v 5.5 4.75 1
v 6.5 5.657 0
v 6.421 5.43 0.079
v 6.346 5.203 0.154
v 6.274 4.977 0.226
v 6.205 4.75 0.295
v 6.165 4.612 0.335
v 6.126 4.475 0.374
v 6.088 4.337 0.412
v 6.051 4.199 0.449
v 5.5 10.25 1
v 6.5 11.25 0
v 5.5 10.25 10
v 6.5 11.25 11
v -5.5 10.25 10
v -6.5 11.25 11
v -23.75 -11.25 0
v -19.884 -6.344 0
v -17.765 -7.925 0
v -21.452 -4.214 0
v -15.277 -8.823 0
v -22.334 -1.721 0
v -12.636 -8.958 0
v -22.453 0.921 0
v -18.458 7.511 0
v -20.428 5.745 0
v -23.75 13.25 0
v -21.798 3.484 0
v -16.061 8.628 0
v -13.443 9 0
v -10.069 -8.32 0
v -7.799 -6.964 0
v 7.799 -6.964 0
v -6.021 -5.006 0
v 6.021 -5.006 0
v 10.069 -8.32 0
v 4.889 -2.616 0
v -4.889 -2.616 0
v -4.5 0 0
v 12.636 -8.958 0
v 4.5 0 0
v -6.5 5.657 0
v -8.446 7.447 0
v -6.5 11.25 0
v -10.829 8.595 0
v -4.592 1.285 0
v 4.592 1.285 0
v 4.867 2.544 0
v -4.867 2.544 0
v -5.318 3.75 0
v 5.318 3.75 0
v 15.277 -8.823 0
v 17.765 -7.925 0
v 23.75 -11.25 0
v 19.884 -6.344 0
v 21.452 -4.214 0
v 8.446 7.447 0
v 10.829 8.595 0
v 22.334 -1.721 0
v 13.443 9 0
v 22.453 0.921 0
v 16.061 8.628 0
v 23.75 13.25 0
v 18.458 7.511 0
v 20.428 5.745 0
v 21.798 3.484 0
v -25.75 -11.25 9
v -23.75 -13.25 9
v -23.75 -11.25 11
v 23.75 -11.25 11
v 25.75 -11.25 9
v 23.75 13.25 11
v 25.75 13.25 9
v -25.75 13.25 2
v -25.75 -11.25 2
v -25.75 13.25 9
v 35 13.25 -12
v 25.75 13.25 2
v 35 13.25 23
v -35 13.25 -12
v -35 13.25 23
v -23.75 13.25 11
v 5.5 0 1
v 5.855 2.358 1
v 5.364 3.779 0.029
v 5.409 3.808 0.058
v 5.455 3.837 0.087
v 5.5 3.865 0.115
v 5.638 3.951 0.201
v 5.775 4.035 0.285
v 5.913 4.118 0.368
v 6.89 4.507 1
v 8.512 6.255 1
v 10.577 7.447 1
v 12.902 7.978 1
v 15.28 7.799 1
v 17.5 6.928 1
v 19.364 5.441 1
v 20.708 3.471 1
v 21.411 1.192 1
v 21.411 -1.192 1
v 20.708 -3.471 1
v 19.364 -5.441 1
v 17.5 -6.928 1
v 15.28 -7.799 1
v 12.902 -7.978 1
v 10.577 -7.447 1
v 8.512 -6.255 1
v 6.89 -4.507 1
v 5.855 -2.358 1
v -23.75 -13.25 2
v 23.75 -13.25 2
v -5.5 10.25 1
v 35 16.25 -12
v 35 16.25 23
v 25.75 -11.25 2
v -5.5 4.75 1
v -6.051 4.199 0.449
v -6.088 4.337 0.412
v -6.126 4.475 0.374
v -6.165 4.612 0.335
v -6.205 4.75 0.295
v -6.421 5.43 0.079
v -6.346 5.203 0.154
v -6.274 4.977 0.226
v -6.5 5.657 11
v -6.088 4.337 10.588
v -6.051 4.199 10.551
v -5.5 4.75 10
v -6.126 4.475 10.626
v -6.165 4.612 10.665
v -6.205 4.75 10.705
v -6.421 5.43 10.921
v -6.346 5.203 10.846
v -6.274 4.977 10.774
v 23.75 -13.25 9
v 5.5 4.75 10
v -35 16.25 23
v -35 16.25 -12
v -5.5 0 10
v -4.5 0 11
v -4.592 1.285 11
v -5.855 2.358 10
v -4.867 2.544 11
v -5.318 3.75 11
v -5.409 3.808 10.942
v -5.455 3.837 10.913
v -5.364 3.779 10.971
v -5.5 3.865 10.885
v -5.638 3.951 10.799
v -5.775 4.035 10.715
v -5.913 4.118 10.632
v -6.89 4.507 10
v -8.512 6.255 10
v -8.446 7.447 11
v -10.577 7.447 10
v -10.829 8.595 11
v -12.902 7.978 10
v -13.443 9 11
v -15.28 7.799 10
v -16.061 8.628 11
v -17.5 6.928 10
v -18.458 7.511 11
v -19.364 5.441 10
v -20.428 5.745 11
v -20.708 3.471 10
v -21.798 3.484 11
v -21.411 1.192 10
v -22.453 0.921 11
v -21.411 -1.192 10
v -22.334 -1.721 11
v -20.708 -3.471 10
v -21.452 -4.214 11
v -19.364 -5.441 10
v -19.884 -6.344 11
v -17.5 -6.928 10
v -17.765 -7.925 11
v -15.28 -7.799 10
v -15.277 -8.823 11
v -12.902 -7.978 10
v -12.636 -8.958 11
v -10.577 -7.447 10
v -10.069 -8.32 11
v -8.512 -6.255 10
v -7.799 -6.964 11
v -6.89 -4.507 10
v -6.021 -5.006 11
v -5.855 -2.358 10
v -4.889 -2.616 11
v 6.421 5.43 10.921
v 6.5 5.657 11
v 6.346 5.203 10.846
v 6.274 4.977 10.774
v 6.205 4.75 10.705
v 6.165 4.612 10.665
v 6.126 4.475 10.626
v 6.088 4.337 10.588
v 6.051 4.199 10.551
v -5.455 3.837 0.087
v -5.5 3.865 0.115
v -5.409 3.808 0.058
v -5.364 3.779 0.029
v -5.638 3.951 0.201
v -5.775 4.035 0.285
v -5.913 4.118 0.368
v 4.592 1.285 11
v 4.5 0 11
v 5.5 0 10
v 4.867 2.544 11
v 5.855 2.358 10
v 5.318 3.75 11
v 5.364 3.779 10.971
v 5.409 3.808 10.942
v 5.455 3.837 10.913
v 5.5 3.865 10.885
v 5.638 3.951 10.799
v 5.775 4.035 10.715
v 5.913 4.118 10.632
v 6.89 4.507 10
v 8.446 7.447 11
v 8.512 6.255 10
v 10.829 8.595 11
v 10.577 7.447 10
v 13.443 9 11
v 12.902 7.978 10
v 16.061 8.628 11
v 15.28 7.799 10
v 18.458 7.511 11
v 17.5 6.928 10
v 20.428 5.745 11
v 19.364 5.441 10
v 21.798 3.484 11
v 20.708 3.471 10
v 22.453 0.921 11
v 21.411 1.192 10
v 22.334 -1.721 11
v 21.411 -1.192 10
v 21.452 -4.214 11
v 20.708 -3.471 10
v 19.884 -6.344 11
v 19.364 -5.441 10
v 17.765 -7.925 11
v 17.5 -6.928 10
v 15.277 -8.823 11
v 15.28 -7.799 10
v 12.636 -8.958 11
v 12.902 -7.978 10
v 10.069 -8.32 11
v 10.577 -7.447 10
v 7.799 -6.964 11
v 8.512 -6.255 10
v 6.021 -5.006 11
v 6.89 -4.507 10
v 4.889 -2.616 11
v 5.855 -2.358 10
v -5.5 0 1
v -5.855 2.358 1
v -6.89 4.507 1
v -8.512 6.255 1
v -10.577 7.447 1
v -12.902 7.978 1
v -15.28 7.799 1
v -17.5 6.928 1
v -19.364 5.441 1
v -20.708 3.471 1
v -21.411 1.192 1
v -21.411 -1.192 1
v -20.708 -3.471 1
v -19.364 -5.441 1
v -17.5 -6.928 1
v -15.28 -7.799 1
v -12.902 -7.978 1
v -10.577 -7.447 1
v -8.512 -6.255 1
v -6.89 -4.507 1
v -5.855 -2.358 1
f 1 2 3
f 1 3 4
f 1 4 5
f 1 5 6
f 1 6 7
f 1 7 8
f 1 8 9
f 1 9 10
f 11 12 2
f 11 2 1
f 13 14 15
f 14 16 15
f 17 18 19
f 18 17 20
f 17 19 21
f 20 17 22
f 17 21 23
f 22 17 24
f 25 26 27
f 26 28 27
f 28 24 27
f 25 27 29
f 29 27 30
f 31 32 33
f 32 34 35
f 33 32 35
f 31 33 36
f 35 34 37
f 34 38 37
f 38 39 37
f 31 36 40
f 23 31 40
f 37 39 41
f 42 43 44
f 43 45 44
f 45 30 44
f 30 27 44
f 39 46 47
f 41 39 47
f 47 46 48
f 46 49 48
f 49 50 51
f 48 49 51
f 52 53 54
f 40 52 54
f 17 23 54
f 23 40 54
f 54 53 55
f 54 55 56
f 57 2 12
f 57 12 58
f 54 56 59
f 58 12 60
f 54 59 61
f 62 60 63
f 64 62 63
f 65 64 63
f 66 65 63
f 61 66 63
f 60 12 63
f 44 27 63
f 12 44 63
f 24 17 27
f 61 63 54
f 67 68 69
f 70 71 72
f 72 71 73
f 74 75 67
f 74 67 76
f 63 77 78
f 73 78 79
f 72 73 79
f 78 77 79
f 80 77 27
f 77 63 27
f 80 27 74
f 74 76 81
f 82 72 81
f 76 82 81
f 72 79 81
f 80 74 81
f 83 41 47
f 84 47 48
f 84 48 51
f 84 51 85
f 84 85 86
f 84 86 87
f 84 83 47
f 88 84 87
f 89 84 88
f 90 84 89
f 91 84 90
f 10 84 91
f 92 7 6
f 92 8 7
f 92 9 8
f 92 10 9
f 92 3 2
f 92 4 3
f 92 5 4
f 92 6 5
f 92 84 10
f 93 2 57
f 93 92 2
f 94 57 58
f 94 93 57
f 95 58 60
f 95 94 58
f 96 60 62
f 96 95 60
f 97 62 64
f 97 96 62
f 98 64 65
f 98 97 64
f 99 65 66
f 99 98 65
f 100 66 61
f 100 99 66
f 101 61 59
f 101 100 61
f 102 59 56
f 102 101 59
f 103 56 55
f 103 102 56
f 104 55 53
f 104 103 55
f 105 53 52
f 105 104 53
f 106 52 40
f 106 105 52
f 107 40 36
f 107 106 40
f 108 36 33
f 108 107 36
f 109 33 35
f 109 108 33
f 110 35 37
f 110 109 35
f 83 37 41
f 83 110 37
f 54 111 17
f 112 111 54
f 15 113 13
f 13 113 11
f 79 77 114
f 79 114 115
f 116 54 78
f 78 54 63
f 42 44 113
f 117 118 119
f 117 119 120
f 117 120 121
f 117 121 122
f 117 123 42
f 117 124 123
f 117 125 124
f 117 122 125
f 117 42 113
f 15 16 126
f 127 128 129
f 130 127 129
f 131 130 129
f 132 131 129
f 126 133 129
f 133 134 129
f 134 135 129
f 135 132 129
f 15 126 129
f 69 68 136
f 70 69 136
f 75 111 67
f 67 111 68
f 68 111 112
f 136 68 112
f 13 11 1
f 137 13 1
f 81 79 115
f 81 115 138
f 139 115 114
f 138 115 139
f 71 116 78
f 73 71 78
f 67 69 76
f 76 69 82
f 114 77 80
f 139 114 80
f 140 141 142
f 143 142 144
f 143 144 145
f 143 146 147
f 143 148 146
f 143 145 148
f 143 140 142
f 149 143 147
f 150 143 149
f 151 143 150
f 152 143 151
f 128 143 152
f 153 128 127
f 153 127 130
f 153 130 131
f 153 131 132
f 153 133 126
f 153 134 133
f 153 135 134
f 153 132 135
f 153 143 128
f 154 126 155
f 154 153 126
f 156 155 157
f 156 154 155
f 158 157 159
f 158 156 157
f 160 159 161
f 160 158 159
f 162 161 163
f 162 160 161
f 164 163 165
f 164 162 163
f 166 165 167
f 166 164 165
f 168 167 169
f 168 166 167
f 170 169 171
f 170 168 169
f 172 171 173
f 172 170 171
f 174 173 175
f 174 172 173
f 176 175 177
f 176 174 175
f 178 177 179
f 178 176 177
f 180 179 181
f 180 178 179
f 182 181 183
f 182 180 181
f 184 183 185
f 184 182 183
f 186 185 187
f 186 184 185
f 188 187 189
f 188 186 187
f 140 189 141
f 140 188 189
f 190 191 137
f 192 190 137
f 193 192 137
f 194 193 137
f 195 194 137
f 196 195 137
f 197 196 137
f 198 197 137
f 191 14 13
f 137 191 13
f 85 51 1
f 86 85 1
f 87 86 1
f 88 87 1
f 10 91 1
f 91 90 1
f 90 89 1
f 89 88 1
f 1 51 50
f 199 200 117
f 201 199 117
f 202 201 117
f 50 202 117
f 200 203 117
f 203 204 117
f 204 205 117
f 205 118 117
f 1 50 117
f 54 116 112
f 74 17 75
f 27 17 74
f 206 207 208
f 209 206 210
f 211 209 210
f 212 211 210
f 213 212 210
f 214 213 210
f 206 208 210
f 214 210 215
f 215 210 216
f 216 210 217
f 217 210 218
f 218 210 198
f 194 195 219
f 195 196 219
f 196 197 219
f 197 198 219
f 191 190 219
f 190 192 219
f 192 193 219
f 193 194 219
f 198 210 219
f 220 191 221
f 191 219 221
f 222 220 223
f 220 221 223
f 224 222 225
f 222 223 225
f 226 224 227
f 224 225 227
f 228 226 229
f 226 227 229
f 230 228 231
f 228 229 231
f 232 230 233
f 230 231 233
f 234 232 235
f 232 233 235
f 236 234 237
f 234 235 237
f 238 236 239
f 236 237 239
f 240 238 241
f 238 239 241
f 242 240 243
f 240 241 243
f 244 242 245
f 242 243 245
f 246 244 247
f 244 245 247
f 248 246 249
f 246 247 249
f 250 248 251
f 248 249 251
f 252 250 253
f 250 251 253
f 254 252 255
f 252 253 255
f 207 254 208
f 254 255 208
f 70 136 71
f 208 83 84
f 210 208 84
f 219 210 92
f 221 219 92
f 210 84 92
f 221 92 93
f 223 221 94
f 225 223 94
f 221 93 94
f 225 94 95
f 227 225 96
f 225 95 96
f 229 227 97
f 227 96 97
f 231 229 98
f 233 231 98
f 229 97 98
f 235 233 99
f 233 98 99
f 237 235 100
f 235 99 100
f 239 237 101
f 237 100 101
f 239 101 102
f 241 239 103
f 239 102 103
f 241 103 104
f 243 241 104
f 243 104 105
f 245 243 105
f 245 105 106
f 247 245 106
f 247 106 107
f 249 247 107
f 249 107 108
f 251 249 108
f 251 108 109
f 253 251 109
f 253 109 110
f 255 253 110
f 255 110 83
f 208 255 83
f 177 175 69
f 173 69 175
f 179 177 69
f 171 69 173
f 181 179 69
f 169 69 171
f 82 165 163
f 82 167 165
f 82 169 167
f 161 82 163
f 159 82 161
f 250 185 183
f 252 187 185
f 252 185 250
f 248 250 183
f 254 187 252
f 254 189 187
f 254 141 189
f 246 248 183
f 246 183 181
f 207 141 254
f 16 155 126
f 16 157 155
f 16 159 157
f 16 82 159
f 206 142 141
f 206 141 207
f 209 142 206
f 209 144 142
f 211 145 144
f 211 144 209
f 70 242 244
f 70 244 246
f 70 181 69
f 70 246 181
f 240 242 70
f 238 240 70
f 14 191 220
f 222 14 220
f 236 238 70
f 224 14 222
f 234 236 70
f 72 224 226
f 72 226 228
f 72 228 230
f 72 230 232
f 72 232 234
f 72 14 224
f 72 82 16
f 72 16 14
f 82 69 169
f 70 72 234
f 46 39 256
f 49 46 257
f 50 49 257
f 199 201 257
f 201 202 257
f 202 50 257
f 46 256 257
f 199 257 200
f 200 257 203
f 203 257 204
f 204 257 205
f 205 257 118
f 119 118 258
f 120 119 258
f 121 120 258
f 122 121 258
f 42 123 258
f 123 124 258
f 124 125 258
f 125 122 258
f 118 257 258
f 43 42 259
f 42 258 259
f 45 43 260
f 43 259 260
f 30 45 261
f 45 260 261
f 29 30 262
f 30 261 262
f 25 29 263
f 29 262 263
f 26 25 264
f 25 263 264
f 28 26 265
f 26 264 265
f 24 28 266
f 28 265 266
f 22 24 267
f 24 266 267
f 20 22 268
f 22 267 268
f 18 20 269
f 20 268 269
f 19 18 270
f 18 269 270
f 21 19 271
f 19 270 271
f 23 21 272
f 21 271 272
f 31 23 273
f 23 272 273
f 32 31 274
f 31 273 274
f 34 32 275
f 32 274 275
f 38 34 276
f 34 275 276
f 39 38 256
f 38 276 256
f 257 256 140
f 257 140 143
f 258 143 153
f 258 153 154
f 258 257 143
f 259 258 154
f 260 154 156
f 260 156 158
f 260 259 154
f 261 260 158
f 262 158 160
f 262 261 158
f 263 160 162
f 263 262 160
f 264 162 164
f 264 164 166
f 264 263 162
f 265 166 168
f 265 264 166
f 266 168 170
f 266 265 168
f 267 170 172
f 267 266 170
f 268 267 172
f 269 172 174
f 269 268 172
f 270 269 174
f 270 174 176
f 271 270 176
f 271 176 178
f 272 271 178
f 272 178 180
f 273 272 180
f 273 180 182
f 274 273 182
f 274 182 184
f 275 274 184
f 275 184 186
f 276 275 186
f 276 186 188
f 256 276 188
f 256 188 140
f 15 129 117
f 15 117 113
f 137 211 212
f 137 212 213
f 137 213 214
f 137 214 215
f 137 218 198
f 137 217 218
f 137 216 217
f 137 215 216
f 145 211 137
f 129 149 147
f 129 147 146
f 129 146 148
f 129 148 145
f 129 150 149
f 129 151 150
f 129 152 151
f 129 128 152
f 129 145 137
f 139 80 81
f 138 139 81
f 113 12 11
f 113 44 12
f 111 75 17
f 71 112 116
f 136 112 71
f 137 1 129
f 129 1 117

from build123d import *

# Parameters (mm, degrees)
F0_W         = 51.5
F0_H         = 26.5
F0_R         = 8
F1_DEPTH     = 11
F2_W         = 70
F2_H         = 35
F2_W_2       = 25.75
F2_H_2       = 11
F3_DEPTH     = 3
F4_SIZE      = 2
F5_T1_DEPTH  = 11
F5_T3_DEPTH  = 5.5
F5_T17_DEPTH = 8.071682988
F5_T21_DEPTH = 13.571682988
F5_T28_DEPTH = 13.571682988
F5_T32_DEPTH = 8.071682988
F5_T39_DEPTH = 13.571682988
F5_T43_DEPTH = 8.071682988
F5_T50_DEPTH = 13.571682988
F5_T54_DEPTH = 8.071682988
F5_T61_DEPTH = 8.071682988
F5_T65_DEPTH = 13.571682988
F5_T72_DEPTH = 13.571682988
F5_T76_DEPTH = 8.071682988
F5_T83_DEPTH = 13.571682988
F5_T87_DEPTH = 8.071682988
F5_T94_DEPTH = 13.571682988
F5_T98_DEPTH = 8.071682988


# Not quite as in the source:
# - a fillet or chamfer that OpenCascade refuses, or shapes differently, is made with other operations: its cross-section is extruded or revolved along the edge and cut away or added


with BuildPart() as f1:
    # F0 (on Top) → F1 (new body)
    with BuildSketch(Plane.XY):
        Rectangle(F0_W, F0_H)
        Polygon((5.5, 10.25), (22.75, 10.25), (22.75, -10.25), (-22.75, -10.25), (-22.75, 10.25), (-5.5, 10.25), align=None, mode=Mode.SUBTRACT)
        Polygon((22.75, -10.25), (22.75, 10.25), (5.5, 10.25), (5.5, 4.75), (-5.5, 4.75), (-5.5, 10.25), (-22.75, 10.25), (-22.75, -10.25), align=None)
        with Locations((-13.5, 0)):
            Circle(F0_R, mode=Mode.SUBTRACT)
        with BuildLine():
            ThreePointArc((21.5, 0), (13.5, -8), (5.5, 0))
            ThreePointArc((5.5, 0), (13.5, 8), (21.5, 0))
        make_face(mode=Mode.SUBTRACT)
    extrude(amount=F1_DEPTH)

    # F2 (on face) → F3 (join)
    with BuildSketch(Plane(origin=(0, 13.25, 0), x_dir=(-1, 0, 0), z_dir=(0, 1, 0))):
        with Locations((0, 5.5)):
            Rectangle(F2_W, F2_H)
        Polygon((25.75, 0), (0, 0), (-25.75, 0), (-25.75, 11), (0, 11), (25.75, 11), align=None, mode=Mode.SUBTRACT)
        with Locations((-12.875, 5.5)):
            Rectangle(F2_W_2, F2_H_2)
        with Locations((12.875, 5.5)):
            Rectangle(F2_W_2, F2_H_2)
    extrude(amount=F3_DEPTH)

    # F4
    f4_edges = [f1.edges().sort_by_distance(p)[0] for p in [
        (-25.75, -13.25, 5.5),
        (25.75, -13.25, 5.5),
        (0, -13.25, 11),
        (25.75, 0, 11),
        (-25.75, 0, 11),
        (25.75, 0, 0),
        (-25.75, 0, 0),
        (0, -13.25, 0),
    ]]
    chamfer(f4_edges, length=F4_SIZE)

    # F5: chamfer of 1 on 12 edges, made by hand

    # F5_s2 → F5_t1 (cut)
    with BuildSketch(Plane.YZ.offset(-5.5)):
        Polygon((3.75, 0), (4.75, 1), (4.75, 0), align=None)
        Polygon((11.25, 0), (10.25, 1), (10.25, 0), align=None)
        Polygon((3.75, 11), (4.75, 10), (4.75, 11), align=None)
        Polygon((11.25, 11), (10.25, 10), (10.25, 11), align=None)
    extrude(amount=F5_T1_DEPTH, mode=Mode.SUBTRACT)

    # F5_s4 → F5_t3 (cut)
    with BuildSketch(Plane.XZ.offset(-10.25)):
        Polygon((6.5, 0), (5.5, 1), (5.5, 0), align=None)
        Polygon((-6.5, 0), (-5.5, 1), (-5.5, 0), align=None)
        Polygon((-6.5, 11), (-5.5, 10), (-5.5, 11), align=None)
        Polygon((6.5, 11), (5.5, 10), (5.5, 11), align=None)
    extrude(amount=F5_T3_DEPTH, mode=Mode.SUBTRACT)

    # F5_s5 → F5_t6 (revolve, cut)
    with BuildSketch(Plane.XZ):
        Polygon((-4.5, 0), (-5.5, 1), (-5.5, 0), align=None)
    revolve(axis=Axis((-13.5, 0, 0), (0, 0, 1)), mode=Mode.SUBTRACT)

    # F5_s7 → F5_t8 (revolve, cut)
    with BuildSketch(Plane.XZ):
        Polygon((4.5, 0), (5.5, 1), (5.5, 0), align=None)
    revolve(axis=Axis((13.5, 0, 0), (0, 0, -1)), mode=Mode.SUBTRACT)

    # F5_s9 → F5_t10 (revolve, cut)
    with BuildSketch(Plane.XZ):
        Polygon((-4.5, 11), (-5.5, 10), (-5.5, 11), align=None)
    revolve(axis=Axis((-13.5, 0, 11), (0, 0, 1)), mode=Mode.SUBTRACT)

    # F5_s11 → F5_t12 (revolve, cut)
    with BuildSketch(Plane.XZ):
        Polygon((4.5, 11), (5.5, 10), (5.5, 11), align=None)
    revolve(axis=Axis((13.5, 0, 11), (0, 0, -1)), mode=Mode.SUBTRACT)


with BuildPart() as f5_tool15:
    # F5_s16 → F5_t17 (new body)
    with BuildSketch(Plane.XZ.offset(-10.25)):
        Polygon((6.5, 0), (5.5, 1), (5.5, 0), align=None)
    extrude(amount=F5_T17_DEPTH)

    split(bisect_by=Plane.XZ.offset(-4.75), keep=Keep.TOP)


with BuildPart() as f5_tool19:
    # F5_s20 → F5_t21 (new body)
    with BuildSketch(Plane.YZ.offset(8.071682988)):
        Polygon((3.75, 0), (4.75, 1), (4.75, 0), align=None)
    extrude(amount=-F5_T21_DEPTH)

    split(bisect_by=Plane.YZ.offset(5.5), keep=Keep.TOP)


with BuildPart() as f5_tool15_1:
    add(f5_tool15.part)

    # F5_t23: intersect F5_tool19
    add(f5_tool19.part, mode=Mode.INTERSECT)


with BuildPart() as f1_1:
    add(f1.part)

    # F5_t13: cut F5_tool15
    add(f5_tool15_1.part, mode=Mode.SUBTRACT)


with BuildPart() as f5_tool26:
    # F5_s27 → F5_t28 (new body)
    with BuildSketch(Plane.YZ.offset(5.5)):
        Polygon((3.75, 0), (4.75, 1), (4.75, 0), align=None)
    extrude(amount=-F5_T28_DEPTH)

    split(bisect_by=Plane.YZ.offset(-5.5), keep=Keep.BOTTOM)


with BuildPart() as f5_tool30:
    # F5_s31 → F5_t32 (new body)
    with BuildSketch(Plane.XZ.offset(-2.178317012)):
        Polygon((-6.5, 0), (-5.5, 1), (-5.5, 0), align=None)
    extrude(amount=-F5_T32_DEPTH)

    split(bisect_by=Plane.XZ.offset(-4.75), keep=Keep.TOP)


with BuildPart() as f5_tool26_1:
    add(f5_tool26.part)

    # F5_t34: intersect F5_tool30
    add(f5_tool30.part, mode=Mode.INTERSECT)


with BuildPart() as f1_2:
    add(f1_1.part)

    # F5_t24: cut F5_tool26
    add(f5_tool26_1.part, mode=Mode.SUBTRACT)


with BuildPart() as f5_tool37:
    # F5_s38 → F5_t39 (new body)
    with BuildSketch(Plane.YZ.offset(-5.5)):
        Polygon((11.25, 0), (10.25, 1), (10.25, 0), align=None)
    extrude(amount=F5_T39_DEPTH)

    split(bisect_by=Plane.YZ.offset(5.5), keep=Keep.TOP)


with BuildPart() as f5_tool41:
    # F5_s42 → F5_t43 (new body)
    with BuildSketch(Plane.XZ.offset(-12.821682988)):
        Polygon((6.5, 0), (5.5, 1), (5.5, 0), align=None)
    extrude(amount=F5_T43_DEPTH)

    split(bisect_by=Plane.XZ.offset(-10.25), keep=Keep.BOTTOM)


with BuildPart() as f5_tool37_1:
    add(f5_tool37.part)

    # F5_t45: intersect F5_tool41
    add(f5_tool41.part, mode=Mode.INTERSECT)


with BuildPart() as f1_3:
    add(f1_2.part)

    # F5_t35: cut F5_tool37
    add(f5_tool37_1.part, mode=Mode.SUBTRACT)


with BuildPart() as f5_tool48:
    # F5_s49 → F5_t50 (new body)
    with BuildSketch(Plane.YZ.offset(-8.071682988)):
        Polygon((11.25, 0), (10.25, 1), (10.25, 0), align=None)
    extrude(amount=F5_T50_DEPTH)

    split(bisect_by=Plane.YZ.offset(-5.5), keep=Keep.BOTTOM)


with BuildPart() as f5_tool52:
    # F5_s53 → F5_t54 (new body)
    with BuildSketch(Plane.XZ.offset(-4.75)):
        Polygon((-6.5, 0), (-5.5, 1), (-5.5, 0), align=None)
    extrude(amount=-F5_T54_DEPTH)

    split(bisect_by=Plane.XZ.offset(-10.25), keep=Keep.BOTTOM)


with BuildPart() as f5_tool48_1:
    add(f5_tool48.part)

    # F5_t56: intersect F5_tool52
    add(f5_tool52.part, mode=Mode.INTERSECT)


with BuildPart() as f1_4:
    add(f1_3.part)

    # F5_t46: cut F5_tool48
    add(f5_tool48_1.part, mode=Mode.SUBTRACT)


with BuildPart() as f5_tool59:
    # F5_s60 → F5_t61 (new body)
    with BuildSketch(Plane.XZ.offset(-10.25)):
        Polygon((6.5, 11), (5.5, 10), (5.5, 11), align=None)
    extrude(amount=F5_T61_DEPTH)

    split(bisect_by=Plane.XZ.offset(-4.75), keep=Keep.TOP)


with BuildPart() as f5_tool63:
    # F5_s64 → F5_t65 (new body)
    with BuildSketch(Plane.YZ.offset(8.071682988)):
        Polygon((3.75, 11), (4.75, 10), (4.75, 11), align=None)
    extrude(amount=-F5_T65_DEPTH)

    split(bisect_by=Plane.YZ.offset(5.5), keep=Keep.TOP)


with BuildPart() as f5_tool59_1:
    add(f5_tool59.part)

    # F5_t67: intersect F5_tool63
    add(f5_tool63.part, mode=Mode.INTERSECT)


with BuildPart() as f1_5:
    add(f1_4.part)

    # F5_t57: cut F5_tool59
    add(f5_tool59_1.part, mode=Mode.SUBTRACT)


with BuildPart() as f5_tool70:
    # F5_s71 → F5_t72 (new body)
    with BuildSketch(Plane.YZ.offset(5.5)):
        Polygon((3.75, 11), (4.75, 10), (4.75, 11), align=None)
    extrude(amount=-F5_T72_DEPTH)

    split(bisect_by=Plane.YZ.offset(-5.5), keep=Keep.BOTTOM)


with BuildPart() as f5_tool74:
    # F5_s75 → F5_t76 (new body)
    with BuildSketch(Plane.XZ.offset(-2.178317012)):
        Polygon((-6.5, 11), (-5.5, 10), (-5.5, 11), align=None)
    extrude(amount=-F5_T76_DEPTH)

    split(bisect_by=Plane.XZ.offset(-4.75), keep=Keep.TOP)


with BuildPart() as f5_tool70_1:
    add(f5_tool70.part)

    # F5_t78: intersect F5_tool74
    add(f5_tool74.part, mode=Mode.INTERSECT)


with BuildPart() as f1_6:
    add(f1_5.part)

    # F5_t68: cut F5_tool70
    add(f5_tool70_1.part, mode=Mode.SUBTRACT)


with BuildPart() as f5_tool81:
    # F5_s82 → F5_t83 (new body)
    with BuildSketch(Plane.YZ.offset(-8.071682988)):
        Polygon((11.25, 11), (10.25, 10), (10.25, 11), align=None)
    extrude(amount=F5_T83_DEPTH)

    split(bisect_by=Plane.YZ.offset(-5.5), keep=Keep.BOTTOM)


with BuildPart() as f5_tool85:
    # F5_s86 → F5_t87 (new body)
    with BuildSketch(Plane.XZ.offset(-4.75)):
        Polygon((-6.5, 11), (-5.5, 10), (-5.5, 11), align=None)
    extrude(amount=-F5_T87_DEPTH)

    split(bisect_by=Plane.XZ.offset(-10.25), keep=Keep.BOTTOM)


with BuildPart() as f5_tool81_1:
    add(f5_tool81.part)

    # F5_t89: intersect F5_tool85
    add(f5_tool85.part, mode=Mode.INTERSECT)


with BuildPart() as f1_7:
    add(f1_6.part)

    # F5_t79: cut F5_tool81
    add(f5_tool81_1.part, mode=Mode.SUBTRACT)


with BuildPart() as f5_tool92:
    # F5_s93 → F5_t94 (new body)
    with BuildSketch(Plane.YZ.offset(-5.5)):
        Polygon((11.25, 11), (10.25, 10), (10.25, 11), align=None)
    extrude(amount=F5_T94_DEPTH)

    split(bisect_by=Plane.YZ.offset(5.5), keep=Keep.TOP)


with BuildPart() as f5_tool96:
    # F5_s97 → F5_t98 (new body)
    with BuildSketch(Plane.XZ.offset(-12.821682988)):
        Polygon((6.5, 11), (5.5, 10), (5.5, 11), align=None)
    extrude(amount=F5_T98_DEPTH)

    split(bisect_by=Plane.XZ.offset(-10.25), keep=Keep.BOTTOM)


with BuildPart() as f5_tool92_1:
    add(f5_tool92.part)

    # F5_t100: intersect F5_tool96
    add(f5_tool96.part, mode=Mode.INTERSECT)


with BuildPart() as f1_8:
    add(f1_7.part)

    # F5_t90: cut F5_tool92
    add(f5_tool92_1.part, mode=Mode.SUBTRACT)


solid = f1_8.part
